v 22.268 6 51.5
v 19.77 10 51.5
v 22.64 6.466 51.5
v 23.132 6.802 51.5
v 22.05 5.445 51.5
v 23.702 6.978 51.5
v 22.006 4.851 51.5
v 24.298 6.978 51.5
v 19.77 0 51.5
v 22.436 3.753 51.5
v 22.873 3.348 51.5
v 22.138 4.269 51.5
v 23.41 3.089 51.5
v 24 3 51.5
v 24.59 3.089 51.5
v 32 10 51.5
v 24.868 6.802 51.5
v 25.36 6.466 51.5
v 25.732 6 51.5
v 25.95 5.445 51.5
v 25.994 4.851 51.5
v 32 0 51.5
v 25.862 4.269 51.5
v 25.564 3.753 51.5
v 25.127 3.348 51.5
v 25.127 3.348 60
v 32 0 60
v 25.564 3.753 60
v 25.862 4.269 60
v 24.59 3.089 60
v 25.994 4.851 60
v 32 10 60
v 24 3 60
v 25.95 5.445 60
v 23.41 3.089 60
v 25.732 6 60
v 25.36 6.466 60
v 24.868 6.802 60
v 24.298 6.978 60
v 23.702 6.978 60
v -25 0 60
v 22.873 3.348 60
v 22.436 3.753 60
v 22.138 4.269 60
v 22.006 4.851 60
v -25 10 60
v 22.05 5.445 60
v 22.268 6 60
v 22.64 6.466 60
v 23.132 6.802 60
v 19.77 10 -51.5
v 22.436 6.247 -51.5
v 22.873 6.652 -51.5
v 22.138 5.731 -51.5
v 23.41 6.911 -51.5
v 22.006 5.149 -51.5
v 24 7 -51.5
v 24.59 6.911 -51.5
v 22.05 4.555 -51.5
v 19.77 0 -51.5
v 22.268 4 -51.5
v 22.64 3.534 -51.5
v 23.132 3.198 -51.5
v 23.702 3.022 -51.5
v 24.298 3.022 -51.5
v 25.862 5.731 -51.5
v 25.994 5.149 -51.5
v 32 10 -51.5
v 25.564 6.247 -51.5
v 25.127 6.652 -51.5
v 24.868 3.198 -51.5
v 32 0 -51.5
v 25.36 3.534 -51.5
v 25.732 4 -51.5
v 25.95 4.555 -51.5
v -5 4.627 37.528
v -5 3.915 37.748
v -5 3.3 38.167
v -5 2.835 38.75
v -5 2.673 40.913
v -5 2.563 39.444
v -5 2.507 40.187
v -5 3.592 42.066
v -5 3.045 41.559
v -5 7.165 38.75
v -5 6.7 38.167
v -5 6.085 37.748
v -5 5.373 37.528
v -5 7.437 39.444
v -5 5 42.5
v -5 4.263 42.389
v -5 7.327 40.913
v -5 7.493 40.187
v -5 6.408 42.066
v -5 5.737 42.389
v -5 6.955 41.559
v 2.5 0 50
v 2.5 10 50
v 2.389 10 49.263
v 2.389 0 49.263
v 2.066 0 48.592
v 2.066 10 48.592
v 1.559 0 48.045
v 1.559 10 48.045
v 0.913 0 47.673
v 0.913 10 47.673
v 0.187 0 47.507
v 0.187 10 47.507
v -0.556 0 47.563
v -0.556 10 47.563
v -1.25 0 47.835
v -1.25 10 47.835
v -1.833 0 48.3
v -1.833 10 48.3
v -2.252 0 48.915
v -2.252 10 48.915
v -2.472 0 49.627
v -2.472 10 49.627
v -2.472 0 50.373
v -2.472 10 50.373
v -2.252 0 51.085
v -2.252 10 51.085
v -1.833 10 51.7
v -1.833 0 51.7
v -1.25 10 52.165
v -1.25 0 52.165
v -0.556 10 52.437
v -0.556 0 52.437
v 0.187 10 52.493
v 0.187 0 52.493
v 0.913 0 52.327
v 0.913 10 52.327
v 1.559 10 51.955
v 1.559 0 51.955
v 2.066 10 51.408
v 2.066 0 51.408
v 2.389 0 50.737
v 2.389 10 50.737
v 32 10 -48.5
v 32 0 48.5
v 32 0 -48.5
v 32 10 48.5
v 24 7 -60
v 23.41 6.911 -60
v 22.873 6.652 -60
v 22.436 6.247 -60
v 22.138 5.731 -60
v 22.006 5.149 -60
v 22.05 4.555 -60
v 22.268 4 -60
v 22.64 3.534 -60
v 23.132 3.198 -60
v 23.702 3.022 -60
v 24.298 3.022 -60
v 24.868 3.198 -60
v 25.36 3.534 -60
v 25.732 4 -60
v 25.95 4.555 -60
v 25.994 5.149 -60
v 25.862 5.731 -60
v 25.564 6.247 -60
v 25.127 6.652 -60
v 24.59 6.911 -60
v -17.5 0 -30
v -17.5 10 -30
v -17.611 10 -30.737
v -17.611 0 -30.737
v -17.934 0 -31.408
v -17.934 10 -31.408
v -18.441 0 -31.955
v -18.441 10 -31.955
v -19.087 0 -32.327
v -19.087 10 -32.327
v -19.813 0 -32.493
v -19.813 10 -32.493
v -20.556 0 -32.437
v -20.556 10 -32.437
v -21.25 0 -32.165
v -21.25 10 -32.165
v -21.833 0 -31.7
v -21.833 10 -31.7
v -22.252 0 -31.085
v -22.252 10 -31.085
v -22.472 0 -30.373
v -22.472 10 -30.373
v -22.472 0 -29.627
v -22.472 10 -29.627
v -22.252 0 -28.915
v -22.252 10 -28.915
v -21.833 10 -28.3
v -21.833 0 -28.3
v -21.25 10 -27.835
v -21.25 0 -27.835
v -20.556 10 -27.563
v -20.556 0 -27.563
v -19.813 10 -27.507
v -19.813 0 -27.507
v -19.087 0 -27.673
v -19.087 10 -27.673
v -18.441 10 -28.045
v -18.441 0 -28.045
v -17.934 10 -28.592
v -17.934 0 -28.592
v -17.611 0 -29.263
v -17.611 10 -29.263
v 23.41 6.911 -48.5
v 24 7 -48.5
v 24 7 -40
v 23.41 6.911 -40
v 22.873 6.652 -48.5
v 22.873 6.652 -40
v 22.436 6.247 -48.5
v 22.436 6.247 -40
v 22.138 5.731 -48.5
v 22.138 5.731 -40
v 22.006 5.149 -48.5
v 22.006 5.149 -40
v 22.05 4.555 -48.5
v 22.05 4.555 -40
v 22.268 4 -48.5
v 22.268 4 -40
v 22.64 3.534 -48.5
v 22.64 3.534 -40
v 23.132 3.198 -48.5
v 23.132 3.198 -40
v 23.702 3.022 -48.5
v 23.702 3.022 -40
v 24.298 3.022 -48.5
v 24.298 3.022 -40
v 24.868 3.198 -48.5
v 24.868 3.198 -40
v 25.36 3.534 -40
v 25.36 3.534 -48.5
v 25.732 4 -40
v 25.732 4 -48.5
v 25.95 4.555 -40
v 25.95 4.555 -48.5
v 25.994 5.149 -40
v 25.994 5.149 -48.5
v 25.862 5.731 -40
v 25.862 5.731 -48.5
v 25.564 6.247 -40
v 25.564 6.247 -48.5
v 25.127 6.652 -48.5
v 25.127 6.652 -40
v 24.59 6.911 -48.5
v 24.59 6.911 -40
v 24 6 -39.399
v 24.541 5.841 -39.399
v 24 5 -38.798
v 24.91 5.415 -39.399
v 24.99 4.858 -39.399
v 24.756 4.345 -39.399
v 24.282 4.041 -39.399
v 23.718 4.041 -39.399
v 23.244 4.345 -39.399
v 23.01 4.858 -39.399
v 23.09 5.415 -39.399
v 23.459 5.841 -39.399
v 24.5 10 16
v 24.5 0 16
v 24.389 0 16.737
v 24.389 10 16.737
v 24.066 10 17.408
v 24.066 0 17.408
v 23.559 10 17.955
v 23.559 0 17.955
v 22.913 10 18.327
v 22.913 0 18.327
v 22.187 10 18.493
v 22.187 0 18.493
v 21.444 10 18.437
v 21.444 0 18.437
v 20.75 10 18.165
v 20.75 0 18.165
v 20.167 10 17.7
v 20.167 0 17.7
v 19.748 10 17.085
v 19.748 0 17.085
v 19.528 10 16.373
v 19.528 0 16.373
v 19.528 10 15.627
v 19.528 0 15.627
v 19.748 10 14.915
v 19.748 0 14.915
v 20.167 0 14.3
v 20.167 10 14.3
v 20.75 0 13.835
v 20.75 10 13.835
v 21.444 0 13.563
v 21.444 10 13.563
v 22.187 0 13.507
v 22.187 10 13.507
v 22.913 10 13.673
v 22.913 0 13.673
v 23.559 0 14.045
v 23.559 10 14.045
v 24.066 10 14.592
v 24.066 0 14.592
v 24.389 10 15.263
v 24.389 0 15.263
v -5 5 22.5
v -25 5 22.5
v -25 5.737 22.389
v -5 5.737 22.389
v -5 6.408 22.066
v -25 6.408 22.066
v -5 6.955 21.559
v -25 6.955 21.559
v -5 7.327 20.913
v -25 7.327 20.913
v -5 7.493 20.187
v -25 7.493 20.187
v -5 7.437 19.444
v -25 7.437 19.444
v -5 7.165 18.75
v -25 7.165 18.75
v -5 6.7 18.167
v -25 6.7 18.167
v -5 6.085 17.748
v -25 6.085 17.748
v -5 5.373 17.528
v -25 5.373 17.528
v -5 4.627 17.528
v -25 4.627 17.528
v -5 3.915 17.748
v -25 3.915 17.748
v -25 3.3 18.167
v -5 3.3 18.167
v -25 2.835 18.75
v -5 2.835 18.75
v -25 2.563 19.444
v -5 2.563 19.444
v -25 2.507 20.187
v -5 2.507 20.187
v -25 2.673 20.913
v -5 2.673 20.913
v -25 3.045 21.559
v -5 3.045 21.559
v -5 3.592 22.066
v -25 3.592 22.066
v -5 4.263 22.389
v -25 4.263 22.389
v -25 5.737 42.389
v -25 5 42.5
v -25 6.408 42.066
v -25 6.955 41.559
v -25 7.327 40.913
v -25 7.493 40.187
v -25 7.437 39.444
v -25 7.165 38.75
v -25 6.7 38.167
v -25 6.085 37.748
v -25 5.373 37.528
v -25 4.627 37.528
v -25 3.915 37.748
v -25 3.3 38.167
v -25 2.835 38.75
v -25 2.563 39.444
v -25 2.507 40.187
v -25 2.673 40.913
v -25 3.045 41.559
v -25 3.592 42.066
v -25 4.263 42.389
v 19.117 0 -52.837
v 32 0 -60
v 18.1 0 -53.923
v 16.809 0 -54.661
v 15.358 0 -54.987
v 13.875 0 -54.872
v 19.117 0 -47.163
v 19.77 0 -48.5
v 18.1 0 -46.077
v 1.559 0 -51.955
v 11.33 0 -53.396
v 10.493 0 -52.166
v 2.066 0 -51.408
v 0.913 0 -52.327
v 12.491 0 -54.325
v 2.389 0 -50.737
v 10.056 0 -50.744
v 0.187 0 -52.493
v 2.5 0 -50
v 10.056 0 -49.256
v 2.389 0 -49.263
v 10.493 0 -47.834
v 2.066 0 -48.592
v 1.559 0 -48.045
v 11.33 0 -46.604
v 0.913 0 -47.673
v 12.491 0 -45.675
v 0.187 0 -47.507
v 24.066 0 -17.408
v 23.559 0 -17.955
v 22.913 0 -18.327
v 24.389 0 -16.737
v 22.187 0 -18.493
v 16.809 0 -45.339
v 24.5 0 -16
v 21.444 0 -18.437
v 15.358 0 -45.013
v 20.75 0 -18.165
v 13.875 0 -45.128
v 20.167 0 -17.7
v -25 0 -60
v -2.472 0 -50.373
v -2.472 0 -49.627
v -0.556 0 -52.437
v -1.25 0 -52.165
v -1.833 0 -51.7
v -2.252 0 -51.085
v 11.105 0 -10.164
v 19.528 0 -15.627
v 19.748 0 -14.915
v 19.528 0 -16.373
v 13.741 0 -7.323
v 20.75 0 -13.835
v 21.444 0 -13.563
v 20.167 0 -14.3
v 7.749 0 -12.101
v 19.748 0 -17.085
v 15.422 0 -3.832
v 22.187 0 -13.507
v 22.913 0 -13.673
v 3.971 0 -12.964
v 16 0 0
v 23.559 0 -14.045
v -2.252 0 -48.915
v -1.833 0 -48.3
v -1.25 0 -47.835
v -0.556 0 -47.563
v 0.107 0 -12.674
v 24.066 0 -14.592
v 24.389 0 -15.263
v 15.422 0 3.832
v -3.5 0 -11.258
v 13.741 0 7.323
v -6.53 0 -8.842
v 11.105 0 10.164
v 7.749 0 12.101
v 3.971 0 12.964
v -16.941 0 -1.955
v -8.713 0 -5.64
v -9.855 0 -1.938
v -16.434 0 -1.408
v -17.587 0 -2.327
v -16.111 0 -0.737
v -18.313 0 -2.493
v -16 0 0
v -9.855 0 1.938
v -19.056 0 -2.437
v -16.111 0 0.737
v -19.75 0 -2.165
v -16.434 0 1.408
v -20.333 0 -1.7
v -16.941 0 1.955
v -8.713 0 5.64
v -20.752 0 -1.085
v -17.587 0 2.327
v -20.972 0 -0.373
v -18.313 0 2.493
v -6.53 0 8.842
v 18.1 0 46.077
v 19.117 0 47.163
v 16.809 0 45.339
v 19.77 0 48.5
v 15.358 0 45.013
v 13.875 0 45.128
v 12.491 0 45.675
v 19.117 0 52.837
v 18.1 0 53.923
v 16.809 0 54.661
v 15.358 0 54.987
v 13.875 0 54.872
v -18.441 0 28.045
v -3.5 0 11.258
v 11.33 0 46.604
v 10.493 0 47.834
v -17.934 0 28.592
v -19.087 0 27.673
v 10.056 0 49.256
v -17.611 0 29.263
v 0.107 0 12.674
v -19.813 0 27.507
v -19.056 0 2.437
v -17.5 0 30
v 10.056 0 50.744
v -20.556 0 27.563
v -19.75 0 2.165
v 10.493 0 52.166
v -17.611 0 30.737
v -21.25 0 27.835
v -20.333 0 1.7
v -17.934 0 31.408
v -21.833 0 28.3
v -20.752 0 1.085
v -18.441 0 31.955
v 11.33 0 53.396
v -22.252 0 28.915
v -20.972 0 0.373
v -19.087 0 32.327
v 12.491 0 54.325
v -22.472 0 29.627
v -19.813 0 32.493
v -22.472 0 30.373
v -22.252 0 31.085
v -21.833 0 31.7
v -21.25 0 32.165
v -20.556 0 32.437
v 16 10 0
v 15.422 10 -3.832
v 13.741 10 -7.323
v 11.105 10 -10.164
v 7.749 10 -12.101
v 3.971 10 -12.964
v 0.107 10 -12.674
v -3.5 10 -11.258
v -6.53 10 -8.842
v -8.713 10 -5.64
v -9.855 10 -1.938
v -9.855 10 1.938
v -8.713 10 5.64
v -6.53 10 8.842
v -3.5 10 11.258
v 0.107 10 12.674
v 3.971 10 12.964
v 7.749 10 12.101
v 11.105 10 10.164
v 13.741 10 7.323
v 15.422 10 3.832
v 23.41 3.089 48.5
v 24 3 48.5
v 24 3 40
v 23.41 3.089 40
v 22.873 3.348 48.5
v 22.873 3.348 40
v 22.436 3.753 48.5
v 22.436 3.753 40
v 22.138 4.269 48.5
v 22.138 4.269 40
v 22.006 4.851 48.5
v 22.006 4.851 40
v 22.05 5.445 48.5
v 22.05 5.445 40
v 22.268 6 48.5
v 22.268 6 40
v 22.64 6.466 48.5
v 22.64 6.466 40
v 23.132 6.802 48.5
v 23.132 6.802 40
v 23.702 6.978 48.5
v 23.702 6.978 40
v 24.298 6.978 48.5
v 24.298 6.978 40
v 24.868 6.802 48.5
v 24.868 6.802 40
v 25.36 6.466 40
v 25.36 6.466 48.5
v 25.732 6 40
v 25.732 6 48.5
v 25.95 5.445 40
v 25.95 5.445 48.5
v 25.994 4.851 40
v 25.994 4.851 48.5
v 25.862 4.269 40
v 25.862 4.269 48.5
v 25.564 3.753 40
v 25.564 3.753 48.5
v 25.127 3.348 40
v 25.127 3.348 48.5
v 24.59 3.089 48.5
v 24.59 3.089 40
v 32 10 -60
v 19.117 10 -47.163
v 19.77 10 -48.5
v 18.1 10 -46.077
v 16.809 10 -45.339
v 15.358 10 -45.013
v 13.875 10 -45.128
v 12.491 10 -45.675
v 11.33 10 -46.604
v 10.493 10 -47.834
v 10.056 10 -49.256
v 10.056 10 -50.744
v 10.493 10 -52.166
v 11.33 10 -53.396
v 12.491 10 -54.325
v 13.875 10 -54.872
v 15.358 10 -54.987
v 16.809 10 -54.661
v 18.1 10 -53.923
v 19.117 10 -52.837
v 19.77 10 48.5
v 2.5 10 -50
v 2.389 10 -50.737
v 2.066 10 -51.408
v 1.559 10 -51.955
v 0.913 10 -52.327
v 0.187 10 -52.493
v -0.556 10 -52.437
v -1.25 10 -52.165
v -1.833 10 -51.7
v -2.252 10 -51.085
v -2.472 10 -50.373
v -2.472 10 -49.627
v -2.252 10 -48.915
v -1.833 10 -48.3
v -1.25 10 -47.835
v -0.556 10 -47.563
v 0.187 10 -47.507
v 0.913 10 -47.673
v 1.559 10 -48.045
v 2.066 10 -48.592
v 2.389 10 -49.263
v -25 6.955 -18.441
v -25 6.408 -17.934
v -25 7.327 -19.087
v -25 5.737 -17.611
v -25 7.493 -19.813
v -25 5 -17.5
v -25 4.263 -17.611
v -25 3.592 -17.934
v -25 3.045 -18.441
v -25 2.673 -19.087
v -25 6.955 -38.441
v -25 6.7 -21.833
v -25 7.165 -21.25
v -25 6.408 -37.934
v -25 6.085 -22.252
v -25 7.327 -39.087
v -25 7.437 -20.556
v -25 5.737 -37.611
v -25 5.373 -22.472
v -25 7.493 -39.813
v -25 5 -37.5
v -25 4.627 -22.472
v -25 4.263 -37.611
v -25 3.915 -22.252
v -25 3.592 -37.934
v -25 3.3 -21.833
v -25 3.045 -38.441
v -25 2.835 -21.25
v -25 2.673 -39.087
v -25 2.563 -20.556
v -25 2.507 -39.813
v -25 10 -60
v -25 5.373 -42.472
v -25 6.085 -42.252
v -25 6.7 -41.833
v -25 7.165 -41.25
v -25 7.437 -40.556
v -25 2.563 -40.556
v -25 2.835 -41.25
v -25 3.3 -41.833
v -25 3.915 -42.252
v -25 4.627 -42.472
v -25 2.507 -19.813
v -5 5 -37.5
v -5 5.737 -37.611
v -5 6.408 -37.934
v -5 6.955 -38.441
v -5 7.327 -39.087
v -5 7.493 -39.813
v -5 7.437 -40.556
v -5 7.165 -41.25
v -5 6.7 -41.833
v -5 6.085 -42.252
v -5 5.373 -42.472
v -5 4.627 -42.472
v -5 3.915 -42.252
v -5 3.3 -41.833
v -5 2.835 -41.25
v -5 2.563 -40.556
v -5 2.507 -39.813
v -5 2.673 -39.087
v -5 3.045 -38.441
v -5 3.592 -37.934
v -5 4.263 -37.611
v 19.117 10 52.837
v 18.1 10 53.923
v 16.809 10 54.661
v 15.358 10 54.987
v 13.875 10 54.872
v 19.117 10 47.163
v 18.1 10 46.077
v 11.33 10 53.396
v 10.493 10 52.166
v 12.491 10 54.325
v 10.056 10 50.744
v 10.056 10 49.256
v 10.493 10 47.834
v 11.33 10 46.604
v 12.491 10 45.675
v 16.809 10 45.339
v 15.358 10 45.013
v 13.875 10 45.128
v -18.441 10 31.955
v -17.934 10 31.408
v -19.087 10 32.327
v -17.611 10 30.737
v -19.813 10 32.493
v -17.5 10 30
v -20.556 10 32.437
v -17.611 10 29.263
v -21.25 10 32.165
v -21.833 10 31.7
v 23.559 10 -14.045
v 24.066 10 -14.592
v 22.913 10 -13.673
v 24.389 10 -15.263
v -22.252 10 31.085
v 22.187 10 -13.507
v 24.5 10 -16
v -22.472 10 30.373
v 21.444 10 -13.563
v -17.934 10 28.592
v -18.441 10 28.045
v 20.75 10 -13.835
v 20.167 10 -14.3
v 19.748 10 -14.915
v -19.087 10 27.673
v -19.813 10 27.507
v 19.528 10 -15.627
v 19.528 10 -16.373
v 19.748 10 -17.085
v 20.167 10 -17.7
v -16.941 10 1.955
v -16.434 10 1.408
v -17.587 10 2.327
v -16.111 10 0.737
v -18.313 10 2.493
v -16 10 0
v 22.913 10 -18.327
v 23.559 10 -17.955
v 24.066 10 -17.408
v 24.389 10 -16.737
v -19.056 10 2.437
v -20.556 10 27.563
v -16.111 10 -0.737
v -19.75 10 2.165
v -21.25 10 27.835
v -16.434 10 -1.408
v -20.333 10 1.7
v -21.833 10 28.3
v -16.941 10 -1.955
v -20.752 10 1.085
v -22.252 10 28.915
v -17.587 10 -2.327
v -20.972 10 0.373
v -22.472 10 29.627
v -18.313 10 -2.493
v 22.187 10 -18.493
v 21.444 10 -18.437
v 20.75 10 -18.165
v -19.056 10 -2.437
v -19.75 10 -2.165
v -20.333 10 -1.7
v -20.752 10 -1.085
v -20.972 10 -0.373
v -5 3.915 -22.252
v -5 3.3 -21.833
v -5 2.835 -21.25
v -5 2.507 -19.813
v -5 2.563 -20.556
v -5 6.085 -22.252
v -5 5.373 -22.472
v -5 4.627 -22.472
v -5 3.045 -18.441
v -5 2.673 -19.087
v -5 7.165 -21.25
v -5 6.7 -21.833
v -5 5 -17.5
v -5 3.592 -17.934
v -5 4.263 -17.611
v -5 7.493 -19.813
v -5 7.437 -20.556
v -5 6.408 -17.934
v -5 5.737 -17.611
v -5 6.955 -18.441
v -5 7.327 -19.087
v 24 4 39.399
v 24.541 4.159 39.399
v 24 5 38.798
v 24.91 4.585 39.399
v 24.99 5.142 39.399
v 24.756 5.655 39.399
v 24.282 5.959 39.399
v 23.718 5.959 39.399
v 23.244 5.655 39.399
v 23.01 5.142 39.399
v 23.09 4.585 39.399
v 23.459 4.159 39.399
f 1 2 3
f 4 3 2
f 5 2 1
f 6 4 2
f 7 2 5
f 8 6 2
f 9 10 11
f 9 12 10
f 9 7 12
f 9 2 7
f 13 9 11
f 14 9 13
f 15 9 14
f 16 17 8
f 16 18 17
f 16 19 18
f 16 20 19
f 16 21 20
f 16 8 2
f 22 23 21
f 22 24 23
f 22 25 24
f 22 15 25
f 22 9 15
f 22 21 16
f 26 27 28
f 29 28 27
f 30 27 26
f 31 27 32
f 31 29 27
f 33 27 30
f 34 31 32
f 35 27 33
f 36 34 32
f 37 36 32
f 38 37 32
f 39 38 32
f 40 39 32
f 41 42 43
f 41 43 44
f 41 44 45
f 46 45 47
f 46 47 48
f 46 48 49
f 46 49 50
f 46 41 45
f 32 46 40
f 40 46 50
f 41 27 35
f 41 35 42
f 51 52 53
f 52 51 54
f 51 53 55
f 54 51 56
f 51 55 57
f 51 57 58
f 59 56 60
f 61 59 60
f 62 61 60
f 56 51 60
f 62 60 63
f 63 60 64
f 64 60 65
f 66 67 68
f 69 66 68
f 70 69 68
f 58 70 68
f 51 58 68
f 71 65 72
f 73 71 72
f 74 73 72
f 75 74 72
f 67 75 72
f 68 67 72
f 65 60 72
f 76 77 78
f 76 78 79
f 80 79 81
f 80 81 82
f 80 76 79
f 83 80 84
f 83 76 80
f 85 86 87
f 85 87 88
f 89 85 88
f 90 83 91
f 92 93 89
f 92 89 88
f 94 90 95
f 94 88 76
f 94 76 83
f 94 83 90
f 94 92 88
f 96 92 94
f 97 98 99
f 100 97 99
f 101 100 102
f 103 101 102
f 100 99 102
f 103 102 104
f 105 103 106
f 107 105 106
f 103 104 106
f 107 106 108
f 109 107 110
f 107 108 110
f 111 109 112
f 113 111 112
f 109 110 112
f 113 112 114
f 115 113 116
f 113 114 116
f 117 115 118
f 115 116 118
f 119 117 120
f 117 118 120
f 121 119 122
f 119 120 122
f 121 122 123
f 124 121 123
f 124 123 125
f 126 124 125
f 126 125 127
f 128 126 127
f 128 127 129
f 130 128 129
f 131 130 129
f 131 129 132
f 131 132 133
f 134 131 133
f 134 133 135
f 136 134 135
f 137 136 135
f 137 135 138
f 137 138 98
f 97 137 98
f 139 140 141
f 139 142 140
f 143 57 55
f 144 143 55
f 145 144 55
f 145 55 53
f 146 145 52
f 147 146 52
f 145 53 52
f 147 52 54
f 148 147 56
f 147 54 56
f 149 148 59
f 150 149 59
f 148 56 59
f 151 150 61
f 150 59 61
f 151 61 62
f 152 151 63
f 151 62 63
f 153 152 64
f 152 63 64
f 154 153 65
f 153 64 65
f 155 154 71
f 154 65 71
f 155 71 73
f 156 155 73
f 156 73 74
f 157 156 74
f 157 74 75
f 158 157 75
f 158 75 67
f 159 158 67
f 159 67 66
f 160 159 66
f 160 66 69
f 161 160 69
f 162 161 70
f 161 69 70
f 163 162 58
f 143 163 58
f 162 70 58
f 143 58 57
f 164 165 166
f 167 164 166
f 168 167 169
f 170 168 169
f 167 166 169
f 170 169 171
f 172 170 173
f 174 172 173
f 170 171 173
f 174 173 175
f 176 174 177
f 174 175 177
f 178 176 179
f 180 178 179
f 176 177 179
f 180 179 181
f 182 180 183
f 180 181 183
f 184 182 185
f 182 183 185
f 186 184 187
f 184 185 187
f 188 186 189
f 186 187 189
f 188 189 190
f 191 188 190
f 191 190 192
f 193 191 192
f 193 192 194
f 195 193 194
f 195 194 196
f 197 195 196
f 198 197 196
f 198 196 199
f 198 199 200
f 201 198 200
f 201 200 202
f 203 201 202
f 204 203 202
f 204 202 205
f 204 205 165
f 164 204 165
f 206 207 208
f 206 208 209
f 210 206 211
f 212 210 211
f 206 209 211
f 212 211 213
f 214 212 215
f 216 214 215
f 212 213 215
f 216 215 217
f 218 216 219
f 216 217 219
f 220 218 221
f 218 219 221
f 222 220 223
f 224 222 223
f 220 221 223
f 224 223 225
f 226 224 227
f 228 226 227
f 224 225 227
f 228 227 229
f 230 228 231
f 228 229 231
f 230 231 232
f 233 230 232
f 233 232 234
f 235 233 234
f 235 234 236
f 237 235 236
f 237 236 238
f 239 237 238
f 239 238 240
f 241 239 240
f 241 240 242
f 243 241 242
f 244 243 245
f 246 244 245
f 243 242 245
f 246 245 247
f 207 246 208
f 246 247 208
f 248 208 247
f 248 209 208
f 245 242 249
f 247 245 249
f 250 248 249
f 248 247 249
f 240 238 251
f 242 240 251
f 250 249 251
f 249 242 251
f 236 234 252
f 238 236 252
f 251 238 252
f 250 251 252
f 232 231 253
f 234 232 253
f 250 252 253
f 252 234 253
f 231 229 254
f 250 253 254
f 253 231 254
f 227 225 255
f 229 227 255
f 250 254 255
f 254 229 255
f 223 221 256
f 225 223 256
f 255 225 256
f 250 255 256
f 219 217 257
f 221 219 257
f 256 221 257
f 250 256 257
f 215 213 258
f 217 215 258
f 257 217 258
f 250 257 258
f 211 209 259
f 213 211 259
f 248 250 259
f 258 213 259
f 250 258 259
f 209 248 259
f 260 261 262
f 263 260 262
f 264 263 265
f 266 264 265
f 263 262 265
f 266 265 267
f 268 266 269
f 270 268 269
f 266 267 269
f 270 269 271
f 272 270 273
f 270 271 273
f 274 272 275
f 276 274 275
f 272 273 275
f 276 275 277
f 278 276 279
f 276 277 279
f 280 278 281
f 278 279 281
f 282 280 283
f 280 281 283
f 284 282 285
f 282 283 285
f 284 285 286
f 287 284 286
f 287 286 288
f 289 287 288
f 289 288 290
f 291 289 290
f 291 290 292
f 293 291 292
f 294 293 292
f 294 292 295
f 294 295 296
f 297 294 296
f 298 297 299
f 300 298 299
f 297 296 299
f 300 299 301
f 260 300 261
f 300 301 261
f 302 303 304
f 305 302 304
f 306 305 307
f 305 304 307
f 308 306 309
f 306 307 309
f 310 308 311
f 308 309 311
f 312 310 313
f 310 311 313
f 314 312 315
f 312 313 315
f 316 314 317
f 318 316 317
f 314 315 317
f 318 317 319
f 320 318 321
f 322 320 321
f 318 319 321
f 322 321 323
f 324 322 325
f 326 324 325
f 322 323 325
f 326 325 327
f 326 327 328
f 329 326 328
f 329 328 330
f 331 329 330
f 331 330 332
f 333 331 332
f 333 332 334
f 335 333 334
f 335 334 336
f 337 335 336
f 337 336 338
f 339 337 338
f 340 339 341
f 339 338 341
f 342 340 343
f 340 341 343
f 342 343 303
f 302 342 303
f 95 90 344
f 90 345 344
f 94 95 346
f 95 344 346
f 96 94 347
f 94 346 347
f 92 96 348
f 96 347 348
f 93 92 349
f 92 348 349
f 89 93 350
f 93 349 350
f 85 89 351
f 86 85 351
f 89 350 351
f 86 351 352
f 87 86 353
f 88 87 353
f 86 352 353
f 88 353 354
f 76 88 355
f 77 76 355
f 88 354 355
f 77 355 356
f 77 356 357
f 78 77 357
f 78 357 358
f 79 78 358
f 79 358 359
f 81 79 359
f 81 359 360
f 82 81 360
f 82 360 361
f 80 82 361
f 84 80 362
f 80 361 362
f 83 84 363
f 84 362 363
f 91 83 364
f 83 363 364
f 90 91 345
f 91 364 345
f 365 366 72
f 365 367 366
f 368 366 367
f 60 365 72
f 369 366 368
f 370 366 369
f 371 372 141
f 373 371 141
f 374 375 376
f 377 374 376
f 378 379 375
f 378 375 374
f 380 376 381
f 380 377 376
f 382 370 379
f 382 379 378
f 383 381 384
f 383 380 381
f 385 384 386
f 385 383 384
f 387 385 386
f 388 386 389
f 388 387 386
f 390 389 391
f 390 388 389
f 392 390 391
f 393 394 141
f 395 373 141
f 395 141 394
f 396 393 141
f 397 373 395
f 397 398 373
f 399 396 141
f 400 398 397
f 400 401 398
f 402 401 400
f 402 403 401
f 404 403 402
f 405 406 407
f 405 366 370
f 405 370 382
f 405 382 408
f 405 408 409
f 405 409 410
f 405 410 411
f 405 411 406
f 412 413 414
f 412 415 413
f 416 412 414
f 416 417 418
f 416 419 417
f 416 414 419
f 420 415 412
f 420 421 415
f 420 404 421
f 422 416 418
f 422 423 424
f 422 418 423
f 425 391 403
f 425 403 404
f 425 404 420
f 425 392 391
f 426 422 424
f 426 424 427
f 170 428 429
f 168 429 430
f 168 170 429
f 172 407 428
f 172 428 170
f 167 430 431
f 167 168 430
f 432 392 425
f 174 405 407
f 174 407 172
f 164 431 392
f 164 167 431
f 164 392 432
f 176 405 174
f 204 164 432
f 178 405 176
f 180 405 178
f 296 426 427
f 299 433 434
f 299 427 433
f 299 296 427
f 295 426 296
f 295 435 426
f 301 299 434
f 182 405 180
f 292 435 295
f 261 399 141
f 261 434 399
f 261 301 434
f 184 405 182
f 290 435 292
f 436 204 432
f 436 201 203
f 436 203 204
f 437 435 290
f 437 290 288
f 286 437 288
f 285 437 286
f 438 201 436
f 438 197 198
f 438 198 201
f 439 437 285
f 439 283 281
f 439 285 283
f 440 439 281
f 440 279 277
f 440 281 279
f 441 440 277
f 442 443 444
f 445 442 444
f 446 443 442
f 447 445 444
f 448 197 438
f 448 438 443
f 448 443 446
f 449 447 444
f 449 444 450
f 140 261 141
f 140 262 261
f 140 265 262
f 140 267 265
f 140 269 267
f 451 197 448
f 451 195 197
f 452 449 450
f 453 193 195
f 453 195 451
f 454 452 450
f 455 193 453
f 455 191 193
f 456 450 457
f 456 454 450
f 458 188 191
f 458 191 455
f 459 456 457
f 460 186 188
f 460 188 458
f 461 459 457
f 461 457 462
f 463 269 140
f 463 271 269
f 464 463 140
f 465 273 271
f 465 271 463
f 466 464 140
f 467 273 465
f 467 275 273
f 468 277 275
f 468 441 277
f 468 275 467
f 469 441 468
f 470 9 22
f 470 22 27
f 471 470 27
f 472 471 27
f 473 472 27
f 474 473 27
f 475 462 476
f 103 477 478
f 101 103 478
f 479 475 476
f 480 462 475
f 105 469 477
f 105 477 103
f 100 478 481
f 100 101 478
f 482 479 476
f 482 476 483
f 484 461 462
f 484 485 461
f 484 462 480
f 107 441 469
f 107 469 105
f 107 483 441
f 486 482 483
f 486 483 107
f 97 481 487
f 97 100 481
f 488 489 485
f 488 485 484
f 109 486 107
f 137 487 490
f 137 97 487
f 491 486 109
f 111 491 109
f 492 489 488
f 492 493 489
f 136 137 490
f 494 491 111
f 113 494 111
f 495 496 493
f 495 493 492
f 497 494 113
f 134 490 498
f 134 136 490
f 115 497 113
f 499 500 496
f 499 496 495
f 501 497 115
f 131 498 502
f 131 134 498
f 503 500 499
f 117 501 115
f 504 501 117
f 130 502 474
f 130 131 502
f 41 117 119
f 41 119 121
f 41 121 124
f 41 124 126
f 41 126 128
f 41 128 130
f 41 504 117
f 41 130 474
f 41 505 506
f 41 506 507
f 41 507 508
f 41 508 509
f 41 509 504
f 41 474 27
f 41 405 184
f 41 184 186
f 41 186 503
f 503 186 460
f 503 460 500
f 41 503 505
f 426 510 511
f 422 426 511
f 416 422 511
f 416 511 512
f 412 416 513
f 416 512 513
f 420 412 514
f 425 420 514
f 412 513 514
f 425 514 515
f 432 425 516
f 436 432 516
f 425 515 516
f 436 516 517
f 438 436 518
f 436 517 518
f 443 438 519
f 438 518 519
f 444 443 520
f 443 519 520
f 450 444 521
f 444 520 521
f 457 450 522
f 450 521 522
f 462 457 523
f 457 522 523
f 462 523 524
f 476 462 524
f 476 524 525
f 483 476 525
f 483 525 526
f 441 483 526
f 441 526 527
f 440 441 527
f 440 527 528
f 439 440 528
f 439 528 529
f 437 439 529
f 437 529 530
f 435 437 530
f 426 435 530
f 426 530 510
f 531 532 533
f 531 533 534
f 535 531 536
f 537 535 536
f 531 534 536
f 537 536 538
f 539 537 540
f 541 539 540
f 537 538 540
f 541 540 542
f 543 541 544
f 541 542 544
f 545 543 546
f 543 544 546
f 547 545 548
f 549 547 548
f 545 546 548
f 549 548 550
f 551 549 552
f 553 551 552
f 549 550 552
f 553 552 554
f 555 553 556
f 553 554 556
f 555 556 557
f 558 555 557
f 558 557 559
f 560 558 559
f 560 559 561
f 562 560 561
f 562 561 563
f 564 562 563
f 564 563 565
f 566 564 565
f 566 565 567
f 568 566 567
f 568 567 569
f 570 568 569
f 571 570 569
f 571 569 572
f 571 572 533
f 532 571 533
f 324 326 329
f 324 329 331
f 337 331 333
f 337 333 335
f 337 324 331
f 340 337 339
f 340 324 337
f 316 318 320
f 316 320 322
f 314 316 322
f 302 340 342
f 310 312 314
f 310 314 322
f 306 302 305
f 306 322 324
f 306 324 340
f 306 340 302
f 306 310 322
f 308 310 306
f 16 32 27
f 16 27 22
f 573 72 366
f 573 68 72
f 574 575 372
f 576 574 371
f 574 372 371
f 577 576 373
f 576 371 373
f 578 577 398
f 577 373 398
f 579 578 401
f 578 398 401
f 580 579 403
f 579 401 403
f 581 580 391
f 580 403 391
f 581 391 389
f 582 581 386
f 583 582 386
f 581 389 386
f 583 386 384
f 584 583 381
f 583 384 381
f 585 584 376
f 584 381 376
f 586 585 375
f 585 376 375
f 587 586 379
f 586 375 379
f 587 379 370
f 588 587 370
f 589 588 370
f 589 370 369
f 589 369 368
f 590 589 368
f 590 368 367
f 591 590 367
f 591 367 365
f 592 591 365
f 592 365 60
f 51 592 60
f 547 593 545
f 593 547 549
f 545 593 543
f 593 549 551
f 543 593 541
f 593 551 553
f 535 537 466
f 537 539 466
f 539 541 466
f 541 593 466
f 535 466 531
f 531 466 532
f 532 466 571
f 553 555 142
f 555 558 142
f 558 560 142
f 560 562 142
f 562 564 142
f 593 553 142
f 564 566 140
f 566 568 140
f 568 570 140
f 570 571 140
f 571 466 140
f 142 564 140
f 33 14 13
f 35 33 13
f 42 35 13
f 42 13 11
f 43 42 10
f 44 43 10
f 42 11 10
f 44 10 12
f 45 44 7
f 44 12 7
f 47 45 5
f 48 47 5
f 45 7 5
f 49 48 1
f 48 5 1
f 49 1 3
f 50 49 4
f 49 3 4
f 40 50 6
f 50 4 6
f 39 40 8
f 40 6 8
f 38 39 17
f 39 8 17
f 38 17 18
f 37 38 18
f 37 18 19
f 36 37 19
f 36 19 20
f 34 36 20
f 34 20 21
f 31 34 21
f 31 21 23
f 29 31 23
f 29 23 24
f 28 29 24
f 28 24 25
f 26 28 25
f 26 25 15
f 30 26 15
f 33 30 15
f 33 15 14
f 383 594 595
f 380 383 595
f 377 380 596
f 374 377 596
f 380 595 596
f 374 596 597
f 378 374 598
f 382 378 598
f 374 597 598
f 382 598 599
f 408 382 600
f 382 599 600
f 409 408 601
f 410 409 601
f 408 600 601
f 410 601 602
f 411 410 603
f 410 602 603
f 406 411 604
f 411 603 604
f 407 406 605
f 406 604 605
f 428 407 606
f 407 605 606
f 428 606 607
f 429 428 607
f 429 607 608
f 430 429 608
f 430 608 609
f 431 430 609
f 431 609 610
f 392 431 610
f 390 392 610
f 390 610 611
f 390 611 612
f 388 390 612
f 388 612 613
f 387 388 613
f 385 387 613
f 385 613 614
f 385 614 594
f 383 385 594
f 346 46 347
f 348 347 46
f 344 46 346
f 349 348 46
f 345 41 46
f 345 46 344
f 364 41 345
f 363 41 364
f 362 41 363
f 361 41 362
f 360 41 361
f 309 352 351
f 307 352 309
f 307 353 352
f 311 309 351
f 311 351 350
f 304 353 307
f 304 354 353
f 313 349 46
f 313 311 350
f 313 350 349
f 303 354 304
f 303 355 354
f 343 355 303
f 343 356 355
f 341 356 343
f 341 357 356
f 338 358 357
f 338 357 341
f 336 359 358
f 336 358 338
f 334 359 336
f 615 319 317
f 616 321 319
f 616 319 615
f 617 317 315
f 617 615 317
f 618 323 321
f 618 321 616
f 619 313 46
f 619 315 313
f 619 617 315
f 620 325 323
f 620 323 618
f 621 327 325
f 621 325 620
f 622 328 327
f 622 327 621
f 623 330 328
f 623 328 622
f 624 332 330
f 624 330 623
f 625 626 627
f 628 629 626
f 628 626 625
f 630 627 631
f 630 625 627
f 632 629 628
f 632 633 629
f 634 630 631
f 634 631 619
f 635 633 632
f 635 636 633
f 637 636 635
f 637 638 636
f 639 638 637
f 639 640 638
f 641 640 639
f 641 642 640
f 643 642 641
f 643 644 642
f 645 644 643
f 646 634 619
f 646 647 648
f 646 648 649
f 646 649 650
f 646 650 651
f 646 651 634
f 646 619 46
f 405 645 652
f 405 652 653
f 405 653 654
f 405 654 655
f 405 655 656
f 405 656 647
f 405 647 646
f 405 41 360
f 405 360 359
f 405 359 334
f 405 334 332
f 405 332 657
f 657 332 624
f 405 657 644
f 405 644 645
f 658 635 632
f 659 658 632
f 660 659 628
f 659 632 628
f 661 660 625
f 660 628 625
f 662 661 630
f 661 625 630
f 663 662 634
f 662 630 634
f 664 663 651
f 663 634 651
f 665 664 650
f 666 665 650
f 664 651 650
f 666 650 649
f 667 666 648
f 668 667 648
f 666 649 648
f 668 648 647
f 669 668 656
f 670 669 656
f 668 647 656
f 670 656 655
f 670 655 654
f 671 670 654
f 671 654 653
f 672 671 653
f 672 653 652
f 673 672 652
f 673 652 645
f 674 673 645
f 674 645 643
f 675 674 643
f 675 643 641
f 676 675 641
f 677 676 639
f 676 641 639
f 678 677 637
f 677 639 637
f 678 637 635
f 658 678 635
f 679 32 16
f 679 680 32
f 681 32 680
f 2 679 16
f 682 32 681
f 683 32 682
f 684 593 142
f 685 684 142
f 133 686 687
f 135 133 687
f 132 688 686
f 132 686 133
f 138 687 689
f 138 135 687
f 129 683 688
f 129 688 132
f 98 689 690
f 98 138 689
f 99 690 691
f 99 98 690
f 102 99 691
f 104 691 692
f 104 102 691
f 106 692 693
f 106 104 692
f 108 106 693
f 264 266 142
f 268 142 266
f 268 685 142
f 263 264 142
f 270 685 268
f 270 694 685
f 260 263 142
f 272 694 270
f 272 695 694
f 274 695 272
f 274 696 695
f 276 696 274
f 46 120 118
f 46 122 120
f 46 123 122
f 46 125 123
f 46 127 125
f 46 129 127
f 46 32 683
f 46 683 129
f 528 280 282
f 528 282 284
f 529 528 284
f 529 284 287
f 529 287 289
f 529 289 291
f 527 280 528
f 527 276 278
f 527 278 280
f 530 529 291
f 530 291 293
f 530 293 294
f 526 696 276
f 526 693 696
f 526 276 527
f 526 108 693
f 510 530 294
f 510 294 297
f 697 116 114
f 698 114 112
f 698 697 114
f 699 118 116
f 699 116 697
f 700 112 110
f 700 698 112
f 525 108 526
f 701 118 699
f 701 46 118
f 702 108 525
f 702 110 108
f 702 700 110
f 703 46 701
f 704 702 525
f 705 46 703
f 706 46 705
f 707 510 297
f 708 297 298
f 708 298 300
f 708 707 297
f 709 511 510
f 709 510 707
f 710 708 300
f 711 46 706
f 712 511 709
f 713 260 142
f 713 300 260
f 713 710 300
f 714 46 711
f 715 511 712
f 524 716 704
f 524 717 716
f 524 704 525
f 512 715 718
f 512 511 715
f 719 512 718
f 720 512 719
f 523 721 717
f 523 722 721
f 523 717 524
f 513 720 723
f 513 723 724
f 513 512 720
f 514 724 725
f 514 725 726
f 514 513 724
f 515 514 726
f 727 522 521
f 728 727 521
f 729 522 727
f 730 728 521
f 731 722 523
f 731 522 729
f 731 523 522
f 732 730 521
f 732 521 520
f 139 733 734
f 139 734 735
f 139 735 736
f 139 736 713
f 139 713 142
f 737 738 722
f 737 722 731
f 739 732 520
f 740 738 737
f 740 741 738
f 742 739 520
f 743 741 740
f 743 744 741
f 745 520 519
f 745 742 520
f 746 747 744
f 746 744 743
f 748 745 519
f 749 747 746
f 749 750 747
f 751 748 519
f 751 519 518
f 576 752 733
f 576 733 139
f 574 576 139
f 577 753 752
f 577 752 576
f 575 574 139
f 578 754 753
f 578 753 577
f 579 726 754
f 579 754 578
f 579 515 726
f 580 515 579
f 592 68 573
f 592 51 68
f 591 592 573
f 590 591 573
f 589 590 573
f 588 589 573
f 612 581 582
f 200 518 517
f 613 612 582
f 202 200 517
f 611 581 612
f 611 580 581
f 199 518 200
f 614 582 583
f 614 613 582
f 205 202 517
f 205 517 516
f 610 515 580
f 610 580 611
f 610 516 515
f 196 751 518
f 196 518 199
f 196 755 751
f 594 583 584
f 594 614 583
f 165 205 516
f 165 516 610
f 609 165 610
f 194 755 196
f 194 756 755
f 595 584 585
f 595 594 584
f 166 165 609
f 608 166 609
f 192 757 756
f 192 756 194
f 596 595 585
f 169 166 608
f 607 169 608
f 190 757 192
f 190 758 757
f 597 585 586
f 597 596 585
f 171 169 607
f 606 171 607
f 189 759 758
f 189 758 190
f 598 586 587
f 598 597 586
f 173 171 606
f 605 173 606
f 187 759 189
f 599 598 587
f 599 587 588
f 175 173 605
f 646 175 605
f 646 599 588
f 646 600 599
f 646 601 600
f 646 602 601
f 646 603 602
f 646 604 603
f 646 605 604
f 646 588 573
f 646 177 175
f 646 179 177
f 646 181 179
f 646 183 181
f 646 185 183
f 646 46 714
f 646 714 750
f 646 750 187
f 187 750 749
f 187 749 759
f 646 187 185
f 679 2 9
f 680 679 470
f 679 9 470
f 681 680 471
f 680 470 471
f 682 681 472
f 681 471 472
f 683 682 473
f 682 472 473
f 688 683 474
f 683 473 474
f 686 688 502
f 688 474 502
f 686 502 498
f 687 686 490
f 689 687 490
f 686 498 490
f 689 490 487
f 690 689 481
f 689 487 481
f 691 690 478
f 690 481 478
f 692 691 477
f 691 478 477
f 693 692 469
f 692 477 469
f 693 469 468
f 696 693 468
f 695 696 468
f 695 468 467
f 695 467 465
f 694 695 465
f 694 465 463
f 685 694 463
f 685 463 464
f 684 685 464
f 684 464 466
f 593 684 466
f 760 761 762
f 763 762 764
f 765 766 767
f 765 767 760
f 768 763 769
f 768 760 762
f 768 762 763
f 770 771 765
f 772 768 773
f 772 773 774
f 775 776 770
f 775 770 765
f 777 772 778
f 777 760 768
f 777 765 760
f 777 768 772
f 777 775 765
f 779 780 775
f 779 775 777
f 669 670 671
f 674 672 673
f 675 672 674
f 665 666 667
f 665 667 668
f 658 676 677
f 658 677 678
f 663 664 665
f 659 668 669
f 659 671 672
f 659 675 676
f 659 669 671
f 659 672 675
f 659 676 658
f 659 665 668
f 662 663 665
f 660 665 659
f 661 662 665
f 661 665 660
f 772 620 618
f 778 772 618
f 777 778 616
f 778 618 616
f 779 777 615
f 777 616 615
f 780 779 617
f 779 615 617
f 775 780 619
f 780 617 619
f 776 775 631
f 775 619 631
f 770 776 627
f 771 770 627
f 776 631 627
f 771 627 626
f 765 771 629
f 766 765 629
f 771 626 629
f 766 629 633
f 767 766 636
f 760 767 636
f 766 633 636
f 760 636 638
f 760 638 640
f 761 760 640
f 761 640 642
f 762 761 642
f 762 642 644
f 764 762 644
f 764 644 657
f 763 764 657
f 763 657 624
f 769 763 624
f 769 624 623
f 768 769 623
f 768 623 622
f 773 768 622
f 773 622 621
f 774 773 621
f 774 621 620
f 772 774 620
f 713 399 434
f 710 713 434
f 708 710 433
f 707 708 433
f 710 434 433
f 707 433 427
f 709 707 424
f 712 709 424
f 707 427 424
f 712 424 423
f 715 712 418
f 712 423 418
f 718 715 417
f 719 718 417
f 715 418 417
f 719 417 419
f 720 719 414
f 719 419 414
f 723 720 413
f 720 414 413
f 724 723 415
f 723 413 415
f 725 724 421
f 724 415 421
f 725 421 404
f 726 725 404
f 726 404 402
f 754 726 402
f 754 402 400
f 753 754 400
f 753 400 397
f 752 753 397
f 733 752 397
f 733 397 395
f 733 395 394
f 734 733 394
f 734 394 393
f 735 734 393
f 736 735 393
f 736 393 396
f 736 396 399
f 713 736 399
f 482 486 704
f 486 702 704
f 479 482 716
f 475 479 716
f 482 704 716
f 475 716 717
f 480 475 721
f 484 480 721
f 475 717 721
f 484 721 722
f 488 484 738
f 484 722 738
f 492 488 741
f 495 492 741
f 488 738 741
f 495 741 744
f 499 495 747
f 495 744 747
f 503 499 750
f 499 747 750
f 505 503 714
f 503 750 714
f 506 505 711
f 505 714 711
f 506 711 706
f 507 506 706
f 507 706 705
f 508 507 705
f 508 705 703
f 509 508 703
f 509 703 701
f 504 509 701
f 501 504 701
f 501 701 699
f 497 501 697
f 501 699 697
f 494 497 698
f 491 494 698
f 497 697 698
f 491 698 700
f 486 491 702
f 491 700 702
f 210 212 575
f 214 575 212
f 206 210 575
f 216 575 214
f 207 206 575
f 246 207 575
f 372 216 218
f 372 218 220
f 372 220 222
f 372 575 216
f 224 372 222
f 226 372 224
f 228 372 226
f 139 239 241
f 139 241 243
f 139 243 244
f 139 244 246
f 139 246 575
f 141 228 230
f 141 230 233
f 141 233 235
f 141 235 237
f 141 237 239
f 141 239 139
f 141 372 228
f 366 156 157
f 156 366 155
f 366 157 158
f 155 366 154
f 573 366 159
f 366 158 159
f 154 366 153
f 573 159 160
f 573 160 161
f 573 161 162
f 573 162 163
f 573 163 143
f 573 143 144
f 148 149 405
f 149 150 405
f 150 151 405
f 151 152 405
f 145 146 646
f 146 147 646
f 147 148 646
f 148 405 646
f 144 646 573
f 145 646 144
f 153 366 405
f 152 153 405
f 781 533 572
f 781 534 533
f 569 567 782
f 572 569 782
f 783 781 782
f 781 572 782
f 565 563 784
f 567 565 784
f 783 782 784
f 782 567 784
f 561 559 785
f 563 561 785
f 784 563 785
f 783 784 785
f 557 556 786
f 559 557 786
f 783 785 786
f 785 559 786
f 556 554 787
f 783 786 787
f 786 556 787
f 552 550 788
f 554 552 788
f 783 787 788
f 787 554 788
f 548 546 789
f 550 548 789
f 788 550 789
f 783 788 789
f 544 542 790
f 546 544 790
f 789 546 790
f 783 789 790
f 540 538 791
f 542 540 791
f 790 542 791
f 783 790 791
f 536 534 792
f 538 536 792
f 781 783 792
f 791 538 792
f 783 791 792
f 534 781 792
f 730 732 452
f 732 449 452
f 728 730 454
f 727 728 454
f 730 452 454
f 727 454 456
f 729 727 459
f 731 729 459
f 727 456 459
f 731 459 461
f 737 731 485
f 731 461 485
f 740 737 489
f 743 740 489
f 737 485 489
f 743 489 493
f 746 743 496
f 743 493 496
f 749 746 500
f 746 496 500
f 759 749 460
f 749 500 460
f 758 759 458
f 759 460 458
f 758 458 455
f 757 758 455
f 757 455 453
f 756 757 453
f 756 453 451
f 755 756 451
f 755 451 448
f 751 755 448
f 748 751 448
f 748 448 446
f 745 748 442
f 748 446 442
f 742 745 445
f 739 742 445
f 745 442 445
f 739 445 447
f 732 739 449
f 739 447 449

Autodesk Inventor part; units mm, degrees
ref_plane "YZ Plane" through (0, 0, 0) normal (1, 0, 0) x (0, 1, 0)
ref_plane "XZ Plane" through (0, 0, 0) normal (0, 1, 0) x (-1, 0, 0)
ref_plane "XY Plane" through (0, 0, 0) normal (0, 0, 1) x (1, 0, 0)
sketch "Szkic10" plane through (0, 0, 0) normal (0, 1, 0) x (-1, 0, 0)
  line L0 (-25, 60) -> (25, 60)
  line L1 (25, 60) -> (25, -60)
  line L2 (25, -60) -> (-25, -60)
  line L3 (-25, -60) -> (-25, 60)
  line L4 (-25, 60) -> (25, -60) construction
  line L5 (25, 60) -> (-25, -60) construction
  point P0 (0, 0)
  dimension "d75" = 50
  dimension "d76" = 120
extrude "Wyciągnięcie proste6" add sketch "Szkic10" along normal blind 10
sketch "Szkic11" plane through (-25, 0, -60) normal (-1, 0, 0) x (0, 0, 1)
  line L0 (120, 0) -> (0, 0) projected
  line L1 (120, 0) -> (120, 10) projected
  line L2 (0, 10) -> (120, 10) projected
  line L3 (0, 0) -> (0, 10) projected
  line L4 (0, 0) -> (120, 0) projected
  line L5 (0, 0) -> (0, 5)
  line L6 (0, 5) -> (120, 5)
  line L7 (0, 5) -> (20, 5)
  line L8 (20, 5) -> (40, 5)
  line L9 (40, 5) -> (80, 5)
  line L10 (80, 5) -> (100, 5)
  circle A0 centre (20, 5) radius 2.5
  circle A1 centre (40, 5) radius 2.5
  circle A2 centre (80, 5) radius 2.5
  circle A3 centre (100, 5) radius 2.5
  point P0 (60, 0)
  dimension "d79" = 5
  dimension "d80" = 20
  dimension "d81" = 20
  dimension "d84" = 5
  dimension "d85" = 5
  dimension "d86" = 5
  dimension "d87" = 5
  dimension "d105" = 20
  dimension "d106" = 20
extrude "Wyciągnięcie proste7" cut sketch "Szkic11" against normal blind 20 contours A3 L6 | L6 A3 | A0 L6 | L6 A0 | A2 L6 | L6 A2 | A1 L6 | L6 A1
sketch "Szkic12" plane through (0, 10, 0) normal (0, 1, 0) x (1, 0, 0)
  line L0 (25, -60) -> (25, 60) projected
  line L1 (25, 0) -> (3, 0)
  circle A0 centre (3, 0) radius 13
  point P0 (0, 0)
  dimension "d102" = 22
  dimension "d103" = 26
extrude "Wyciągnięcie proste8" cut sketch "Szkic12" against normal up to next
sketch "Szkic13" plane through (0, 0, 0) normal (0, -1, 0) x (1, 0, 0)
  line L0 (25, 60) -> (-25, 60) projected
  line L1 (-25, 60) -> (-25, -60) projected
  line L2 (-25, -60) -> (25, -60) projected
  line L3 (25, -60) -> (25, 60) projected
  line L4 (25, 60) -> (25, 50)
  line L5 (25, -60) -> (25, 60) projected
  line L6 (25, 50) -> (-25, 50)
  line L7 (25, -60) -> (25, -50)
  line L8 (25, -50) -> (-25, -50)
  line L9 (25, 50) -> (15, 50)
  line L10 (25, -50) -> (15, -50)
  circle A0 centre (15, 50) radius 5
  circle A1 centre (15, -50) radius 5
  point P0 (0, 0)
  dimension "d93" = 10
  dimension "d94" = 10
  dimension "d95" = 10
  dimension "d96" = 10
  dimension "d97" = 10
  dimension "d98" = 10
extrude "Wyciągnięcie proste9" cut sketch "Szkic13" against normal blind 3 contours A0 L6 | L6 A0 | A1 L8 | L8 A1
sketch "Szkic14" plane through (15, 3, -50) normal (0, -1, 0) x (1, 0, 0)
  circle A0 centre (0, 0) radius 5 projected
  circle A1 centre (0, 100) radius 5 projected
  point P0 (-15, 50)
extrude "Wyciągnięcie proste10" cut sketch "Szkic14" against normal blind 10
sketch "Szkic15" plane through (25, 0, 60) normal (1, 0, 0) x (0, 0, -1)
  line L0 (120, 0) -> (0, 0) projected
  line L1 (120, 0) -> (120, 10) projected
  line L2 (0, 10) -> (120, 10) projected
  line L3 (0, 0) -> (0, 10) projected
  point P0 (60, 0)
extrude "Wyciągnięcie proste11" add sketch "Szkic15" along normal blind 7
sketch "Szkic16" plane through (-25, 0, 60) normal (0, 0, 1) x (1, 0, 0)
  line L0 (57, 0) -> (0, 0) projected
  line L1 (57, 10) -> (57, 0) projected
  line L2 (0, 10) -> (57, 10) projected
  line L3 (0, 0) -> (0, 10) projected
  line L4 (35, 10) -> (45, 10) projected
  line L5 (45, 0) -> (35, 0) projected
  line L6 (53, 0) -> (45, 0)
  line L7 (57, 0) -> (0, 0) projected
  line L8 (45, 0) -> (45, 10)
  line L9 (0, 10) -> (57, 10) projected
  line L10 (57, 10) -> (57, 0) projected
  line L11 (53, 5) -> (45, 5)
  line L12 (45, 5) -> (49, 5)
  circle A0 centre (49, 5) radius 2
  line L13 (49, 5) -> (53, 5)
  line L14 (53, 5) -> (53, 10)
  line L15 (53, 5) -> (53, 0)
  point P0 (25, 0)
  dimension "d113" = 4
  dimension "d114" = 4
  dimension "d115" = 5
  dimension "d116" = 45
  dimension "d117" = 4
sketch "Szkic17" plane through (-25, 0, -60) normal (0, 0, -1) x (-1, 0, 0)
  line L0 (-53, 10) -> (0, 10)
  line L1 (-53, 0) -> (-53, 10)
  line L2 (0, 0) -> (-53, 0)
  line L3 (0, 10) -> (0, 0)
  line L4 (-35, 0) -> (-45, 0)
  line L5 (-45, 10) -> (-35, 10)
  line L6 (-53, 10) -> (-45, 10)
  line L7 (-53, 10) -> (0, 10)
  line L8 (-45, 10) -> (-45, 0)
  line L9 (0, 0) -> (-53, 0)
  line L10 (-53, 0) -> (-53, 10)
  line L11 (-53, 5) -> (-45, 5)
  line L12 (-45, 5) -> (-49, 5)
  circle A0 centre (-49, 5) radius 2
  line L13 (-49, 5) -> (-53, 5)
  line L14 (-53, 5) -> (-53, 0)
  line L15 (-53, 5) -> (-53, 10)
  line L16 (0, 0) -> (-57, 0) projected
  line L17 (0, 0) -> (0, 10) projected
  point P0 (-25, 0)
  point P1 (-25, 10)
  dimension "d119" = 4
  dimension "d120" = 4
  dimension "d121" = 5
  dimension "d122" = 45
  dimension "d123" = 4
hole "Otwór4" at (24, 5, -60) direction (0, 0, 1) diameter 4 depth 20 tip angle 118
hole "Otwór5" at (24, 5, 60) direction (0, 0, -1) diameter 4 depth 20 tip angle 118
sketch "Szkic18" plane through (0, 0, 0) normal (0, -1, 0) x (1, 0, 0)
  circle A0 centre (15, -50) radius 5 projected
  circle A1 centre (15, 50) radius 5 projected
  circle A2 centre (3, 0) radius 13 projected
  line L0 (32, 60) -> (-25, 60) projected
  line L1 (-25, 60) -> (-25, -60) projected
  line L2 (-25, -60) -> (32, -60) projected
  line L3 (32, 60) -> (32, -60) projected
  line L4 (15, -50) -> (32, -50)
  line L5 (15, 50) -> (32, 50)
  line L6 (32, -60) -> (32, 60) projected
  line L7 (15, 50) -> (15, 51.5)
  line L8 (15, 51.5) -> (32, 51.5)
  line L9 (15, 50) -> (15, 48.5)
  line L10 (15, 48.5) -> (32, 48.5)
  line L11 (15, -50) -> (15, -48.5)
  line L12 (15, -48.5) -> (32, -48.5)
  line L13 (15, -50) -> (15, -51.5)
  line L14 (15, -51.5) -> (32, -51.5)
  point P0 (0, 0)
  dimension "d138" = 1.5
  dimension "d139" = 1.5
  dimension "d140" = 1.5
  dimension "d141" = 1.5
extrude "Wyciągnięcie proste12" cut sketch "Szkic18" against normal up to next contours L4 L11 L12 A0 | L4 L3 L14 A0 | A0 L14 L13 L4 | A0 L12 L3 L4 | L10 A1 L5 L3 | L5 A1 L8 L3 | L10 L9 L5 A1 | L5 L7 L8 A1
thread "Gwint9" size "M5x0.8" class "6H" standard "ANSI Metric M Profile" full length
thread "Gwint10" size "M5x0.8" class "6H" standard "ANSI Metric M Profile" full length
thread "Gwint11" size "M5x0.8" class "6H" standard "ANSI Metric M Profile" full length
thread "Gwint12" size "M5x0.8" class "6H" standard "ANSI Metric M Profile" full length
sketch "Szkic20" plane through (0, 0, 0) normal (0, -1, 0) x (1, 0, 0)
  line L0 (32, 48.5) -> (32, -48.5) projected
  line L1 (-25, 60) -> (-25, -60) projected
  circle A0 centre (3, 0) radius 13 projected
  circle A1 centre (22, 16) radius 2.5
  circle A2 centre (22, -16) radius 2.5
  circle A3 centre (-18.5, 0) radius 2.5
  circle A4 centre (3, 0) radius 15
  line L2 (-25, 25) -> (-25, -25)
  line L3 (-25, -25) -> (32, -25)
  line L4 (32, -25) -> (32, 25)
  line L5 (32, 25) -> (-25, 25)
  point P0 (0, 0)
extrude "Wyciągnięcie proste14" cut sketch "Szkic20" against normal up to next contours A1 | A2 | A3
thread "Gwint13" size "M5x0.8" class "6H" standard "ANSI Metric M Profile" full length
thread "Gwint14" size "M5x0.8" class "6H" standard "ANSI Metric M Profile" full length
thread "Gwint15" size "M5x0.8" class "6H" standard "ANSI Metric M Profile" full length
sketch "Szkic21" plane through (0, 10, 0) normal (0, 1, 0) x (1, 0, 0)
  line L0 (32, 48.5) -> (32, -48.5)
  line L1 (32, -51.5) -> (32, -60)
  line L2 (32, 60) -> (32, 30)
  line L3 (-25, -60) -> (-25, 60)
  line L4 (-25, -60) -> (32, -60)
  line L5 (-25, 60) -> (32, 60)
  circle A0 centre (0, 50) radius 2.5
  circle A1 centre (-20, 30) radius 2.5
  circle A2 centre (-20, -30) radius 2.5
  circle A3 centre (0, -50) radius 2.5
  line L6 (-25, -60) -> (32, -60) projected
  line L7 (32, -51.5) -> (32, -60) projected
  point P0 (0, 0)
extrude "Wyciągnięcie proste15" cut sketch "Szkic21" against normal up to next
thread "Gwint16" size "M5x0.8" class "6H" standard "ANSI Metric M Profile" full length
thread "Gwint17" size "M5x0.8" class "6H" standard "ANSI Metric M Profile" full length
thread "Gwint18" size "M5x0.8" class "6H" standard "ANSI Metric M Profile" full length
thread "Gwint19" size "M5x0.8" class "6H" standard "ANSI Metric M Profile" full length
properties part number "Podstawa górna osi Z"
